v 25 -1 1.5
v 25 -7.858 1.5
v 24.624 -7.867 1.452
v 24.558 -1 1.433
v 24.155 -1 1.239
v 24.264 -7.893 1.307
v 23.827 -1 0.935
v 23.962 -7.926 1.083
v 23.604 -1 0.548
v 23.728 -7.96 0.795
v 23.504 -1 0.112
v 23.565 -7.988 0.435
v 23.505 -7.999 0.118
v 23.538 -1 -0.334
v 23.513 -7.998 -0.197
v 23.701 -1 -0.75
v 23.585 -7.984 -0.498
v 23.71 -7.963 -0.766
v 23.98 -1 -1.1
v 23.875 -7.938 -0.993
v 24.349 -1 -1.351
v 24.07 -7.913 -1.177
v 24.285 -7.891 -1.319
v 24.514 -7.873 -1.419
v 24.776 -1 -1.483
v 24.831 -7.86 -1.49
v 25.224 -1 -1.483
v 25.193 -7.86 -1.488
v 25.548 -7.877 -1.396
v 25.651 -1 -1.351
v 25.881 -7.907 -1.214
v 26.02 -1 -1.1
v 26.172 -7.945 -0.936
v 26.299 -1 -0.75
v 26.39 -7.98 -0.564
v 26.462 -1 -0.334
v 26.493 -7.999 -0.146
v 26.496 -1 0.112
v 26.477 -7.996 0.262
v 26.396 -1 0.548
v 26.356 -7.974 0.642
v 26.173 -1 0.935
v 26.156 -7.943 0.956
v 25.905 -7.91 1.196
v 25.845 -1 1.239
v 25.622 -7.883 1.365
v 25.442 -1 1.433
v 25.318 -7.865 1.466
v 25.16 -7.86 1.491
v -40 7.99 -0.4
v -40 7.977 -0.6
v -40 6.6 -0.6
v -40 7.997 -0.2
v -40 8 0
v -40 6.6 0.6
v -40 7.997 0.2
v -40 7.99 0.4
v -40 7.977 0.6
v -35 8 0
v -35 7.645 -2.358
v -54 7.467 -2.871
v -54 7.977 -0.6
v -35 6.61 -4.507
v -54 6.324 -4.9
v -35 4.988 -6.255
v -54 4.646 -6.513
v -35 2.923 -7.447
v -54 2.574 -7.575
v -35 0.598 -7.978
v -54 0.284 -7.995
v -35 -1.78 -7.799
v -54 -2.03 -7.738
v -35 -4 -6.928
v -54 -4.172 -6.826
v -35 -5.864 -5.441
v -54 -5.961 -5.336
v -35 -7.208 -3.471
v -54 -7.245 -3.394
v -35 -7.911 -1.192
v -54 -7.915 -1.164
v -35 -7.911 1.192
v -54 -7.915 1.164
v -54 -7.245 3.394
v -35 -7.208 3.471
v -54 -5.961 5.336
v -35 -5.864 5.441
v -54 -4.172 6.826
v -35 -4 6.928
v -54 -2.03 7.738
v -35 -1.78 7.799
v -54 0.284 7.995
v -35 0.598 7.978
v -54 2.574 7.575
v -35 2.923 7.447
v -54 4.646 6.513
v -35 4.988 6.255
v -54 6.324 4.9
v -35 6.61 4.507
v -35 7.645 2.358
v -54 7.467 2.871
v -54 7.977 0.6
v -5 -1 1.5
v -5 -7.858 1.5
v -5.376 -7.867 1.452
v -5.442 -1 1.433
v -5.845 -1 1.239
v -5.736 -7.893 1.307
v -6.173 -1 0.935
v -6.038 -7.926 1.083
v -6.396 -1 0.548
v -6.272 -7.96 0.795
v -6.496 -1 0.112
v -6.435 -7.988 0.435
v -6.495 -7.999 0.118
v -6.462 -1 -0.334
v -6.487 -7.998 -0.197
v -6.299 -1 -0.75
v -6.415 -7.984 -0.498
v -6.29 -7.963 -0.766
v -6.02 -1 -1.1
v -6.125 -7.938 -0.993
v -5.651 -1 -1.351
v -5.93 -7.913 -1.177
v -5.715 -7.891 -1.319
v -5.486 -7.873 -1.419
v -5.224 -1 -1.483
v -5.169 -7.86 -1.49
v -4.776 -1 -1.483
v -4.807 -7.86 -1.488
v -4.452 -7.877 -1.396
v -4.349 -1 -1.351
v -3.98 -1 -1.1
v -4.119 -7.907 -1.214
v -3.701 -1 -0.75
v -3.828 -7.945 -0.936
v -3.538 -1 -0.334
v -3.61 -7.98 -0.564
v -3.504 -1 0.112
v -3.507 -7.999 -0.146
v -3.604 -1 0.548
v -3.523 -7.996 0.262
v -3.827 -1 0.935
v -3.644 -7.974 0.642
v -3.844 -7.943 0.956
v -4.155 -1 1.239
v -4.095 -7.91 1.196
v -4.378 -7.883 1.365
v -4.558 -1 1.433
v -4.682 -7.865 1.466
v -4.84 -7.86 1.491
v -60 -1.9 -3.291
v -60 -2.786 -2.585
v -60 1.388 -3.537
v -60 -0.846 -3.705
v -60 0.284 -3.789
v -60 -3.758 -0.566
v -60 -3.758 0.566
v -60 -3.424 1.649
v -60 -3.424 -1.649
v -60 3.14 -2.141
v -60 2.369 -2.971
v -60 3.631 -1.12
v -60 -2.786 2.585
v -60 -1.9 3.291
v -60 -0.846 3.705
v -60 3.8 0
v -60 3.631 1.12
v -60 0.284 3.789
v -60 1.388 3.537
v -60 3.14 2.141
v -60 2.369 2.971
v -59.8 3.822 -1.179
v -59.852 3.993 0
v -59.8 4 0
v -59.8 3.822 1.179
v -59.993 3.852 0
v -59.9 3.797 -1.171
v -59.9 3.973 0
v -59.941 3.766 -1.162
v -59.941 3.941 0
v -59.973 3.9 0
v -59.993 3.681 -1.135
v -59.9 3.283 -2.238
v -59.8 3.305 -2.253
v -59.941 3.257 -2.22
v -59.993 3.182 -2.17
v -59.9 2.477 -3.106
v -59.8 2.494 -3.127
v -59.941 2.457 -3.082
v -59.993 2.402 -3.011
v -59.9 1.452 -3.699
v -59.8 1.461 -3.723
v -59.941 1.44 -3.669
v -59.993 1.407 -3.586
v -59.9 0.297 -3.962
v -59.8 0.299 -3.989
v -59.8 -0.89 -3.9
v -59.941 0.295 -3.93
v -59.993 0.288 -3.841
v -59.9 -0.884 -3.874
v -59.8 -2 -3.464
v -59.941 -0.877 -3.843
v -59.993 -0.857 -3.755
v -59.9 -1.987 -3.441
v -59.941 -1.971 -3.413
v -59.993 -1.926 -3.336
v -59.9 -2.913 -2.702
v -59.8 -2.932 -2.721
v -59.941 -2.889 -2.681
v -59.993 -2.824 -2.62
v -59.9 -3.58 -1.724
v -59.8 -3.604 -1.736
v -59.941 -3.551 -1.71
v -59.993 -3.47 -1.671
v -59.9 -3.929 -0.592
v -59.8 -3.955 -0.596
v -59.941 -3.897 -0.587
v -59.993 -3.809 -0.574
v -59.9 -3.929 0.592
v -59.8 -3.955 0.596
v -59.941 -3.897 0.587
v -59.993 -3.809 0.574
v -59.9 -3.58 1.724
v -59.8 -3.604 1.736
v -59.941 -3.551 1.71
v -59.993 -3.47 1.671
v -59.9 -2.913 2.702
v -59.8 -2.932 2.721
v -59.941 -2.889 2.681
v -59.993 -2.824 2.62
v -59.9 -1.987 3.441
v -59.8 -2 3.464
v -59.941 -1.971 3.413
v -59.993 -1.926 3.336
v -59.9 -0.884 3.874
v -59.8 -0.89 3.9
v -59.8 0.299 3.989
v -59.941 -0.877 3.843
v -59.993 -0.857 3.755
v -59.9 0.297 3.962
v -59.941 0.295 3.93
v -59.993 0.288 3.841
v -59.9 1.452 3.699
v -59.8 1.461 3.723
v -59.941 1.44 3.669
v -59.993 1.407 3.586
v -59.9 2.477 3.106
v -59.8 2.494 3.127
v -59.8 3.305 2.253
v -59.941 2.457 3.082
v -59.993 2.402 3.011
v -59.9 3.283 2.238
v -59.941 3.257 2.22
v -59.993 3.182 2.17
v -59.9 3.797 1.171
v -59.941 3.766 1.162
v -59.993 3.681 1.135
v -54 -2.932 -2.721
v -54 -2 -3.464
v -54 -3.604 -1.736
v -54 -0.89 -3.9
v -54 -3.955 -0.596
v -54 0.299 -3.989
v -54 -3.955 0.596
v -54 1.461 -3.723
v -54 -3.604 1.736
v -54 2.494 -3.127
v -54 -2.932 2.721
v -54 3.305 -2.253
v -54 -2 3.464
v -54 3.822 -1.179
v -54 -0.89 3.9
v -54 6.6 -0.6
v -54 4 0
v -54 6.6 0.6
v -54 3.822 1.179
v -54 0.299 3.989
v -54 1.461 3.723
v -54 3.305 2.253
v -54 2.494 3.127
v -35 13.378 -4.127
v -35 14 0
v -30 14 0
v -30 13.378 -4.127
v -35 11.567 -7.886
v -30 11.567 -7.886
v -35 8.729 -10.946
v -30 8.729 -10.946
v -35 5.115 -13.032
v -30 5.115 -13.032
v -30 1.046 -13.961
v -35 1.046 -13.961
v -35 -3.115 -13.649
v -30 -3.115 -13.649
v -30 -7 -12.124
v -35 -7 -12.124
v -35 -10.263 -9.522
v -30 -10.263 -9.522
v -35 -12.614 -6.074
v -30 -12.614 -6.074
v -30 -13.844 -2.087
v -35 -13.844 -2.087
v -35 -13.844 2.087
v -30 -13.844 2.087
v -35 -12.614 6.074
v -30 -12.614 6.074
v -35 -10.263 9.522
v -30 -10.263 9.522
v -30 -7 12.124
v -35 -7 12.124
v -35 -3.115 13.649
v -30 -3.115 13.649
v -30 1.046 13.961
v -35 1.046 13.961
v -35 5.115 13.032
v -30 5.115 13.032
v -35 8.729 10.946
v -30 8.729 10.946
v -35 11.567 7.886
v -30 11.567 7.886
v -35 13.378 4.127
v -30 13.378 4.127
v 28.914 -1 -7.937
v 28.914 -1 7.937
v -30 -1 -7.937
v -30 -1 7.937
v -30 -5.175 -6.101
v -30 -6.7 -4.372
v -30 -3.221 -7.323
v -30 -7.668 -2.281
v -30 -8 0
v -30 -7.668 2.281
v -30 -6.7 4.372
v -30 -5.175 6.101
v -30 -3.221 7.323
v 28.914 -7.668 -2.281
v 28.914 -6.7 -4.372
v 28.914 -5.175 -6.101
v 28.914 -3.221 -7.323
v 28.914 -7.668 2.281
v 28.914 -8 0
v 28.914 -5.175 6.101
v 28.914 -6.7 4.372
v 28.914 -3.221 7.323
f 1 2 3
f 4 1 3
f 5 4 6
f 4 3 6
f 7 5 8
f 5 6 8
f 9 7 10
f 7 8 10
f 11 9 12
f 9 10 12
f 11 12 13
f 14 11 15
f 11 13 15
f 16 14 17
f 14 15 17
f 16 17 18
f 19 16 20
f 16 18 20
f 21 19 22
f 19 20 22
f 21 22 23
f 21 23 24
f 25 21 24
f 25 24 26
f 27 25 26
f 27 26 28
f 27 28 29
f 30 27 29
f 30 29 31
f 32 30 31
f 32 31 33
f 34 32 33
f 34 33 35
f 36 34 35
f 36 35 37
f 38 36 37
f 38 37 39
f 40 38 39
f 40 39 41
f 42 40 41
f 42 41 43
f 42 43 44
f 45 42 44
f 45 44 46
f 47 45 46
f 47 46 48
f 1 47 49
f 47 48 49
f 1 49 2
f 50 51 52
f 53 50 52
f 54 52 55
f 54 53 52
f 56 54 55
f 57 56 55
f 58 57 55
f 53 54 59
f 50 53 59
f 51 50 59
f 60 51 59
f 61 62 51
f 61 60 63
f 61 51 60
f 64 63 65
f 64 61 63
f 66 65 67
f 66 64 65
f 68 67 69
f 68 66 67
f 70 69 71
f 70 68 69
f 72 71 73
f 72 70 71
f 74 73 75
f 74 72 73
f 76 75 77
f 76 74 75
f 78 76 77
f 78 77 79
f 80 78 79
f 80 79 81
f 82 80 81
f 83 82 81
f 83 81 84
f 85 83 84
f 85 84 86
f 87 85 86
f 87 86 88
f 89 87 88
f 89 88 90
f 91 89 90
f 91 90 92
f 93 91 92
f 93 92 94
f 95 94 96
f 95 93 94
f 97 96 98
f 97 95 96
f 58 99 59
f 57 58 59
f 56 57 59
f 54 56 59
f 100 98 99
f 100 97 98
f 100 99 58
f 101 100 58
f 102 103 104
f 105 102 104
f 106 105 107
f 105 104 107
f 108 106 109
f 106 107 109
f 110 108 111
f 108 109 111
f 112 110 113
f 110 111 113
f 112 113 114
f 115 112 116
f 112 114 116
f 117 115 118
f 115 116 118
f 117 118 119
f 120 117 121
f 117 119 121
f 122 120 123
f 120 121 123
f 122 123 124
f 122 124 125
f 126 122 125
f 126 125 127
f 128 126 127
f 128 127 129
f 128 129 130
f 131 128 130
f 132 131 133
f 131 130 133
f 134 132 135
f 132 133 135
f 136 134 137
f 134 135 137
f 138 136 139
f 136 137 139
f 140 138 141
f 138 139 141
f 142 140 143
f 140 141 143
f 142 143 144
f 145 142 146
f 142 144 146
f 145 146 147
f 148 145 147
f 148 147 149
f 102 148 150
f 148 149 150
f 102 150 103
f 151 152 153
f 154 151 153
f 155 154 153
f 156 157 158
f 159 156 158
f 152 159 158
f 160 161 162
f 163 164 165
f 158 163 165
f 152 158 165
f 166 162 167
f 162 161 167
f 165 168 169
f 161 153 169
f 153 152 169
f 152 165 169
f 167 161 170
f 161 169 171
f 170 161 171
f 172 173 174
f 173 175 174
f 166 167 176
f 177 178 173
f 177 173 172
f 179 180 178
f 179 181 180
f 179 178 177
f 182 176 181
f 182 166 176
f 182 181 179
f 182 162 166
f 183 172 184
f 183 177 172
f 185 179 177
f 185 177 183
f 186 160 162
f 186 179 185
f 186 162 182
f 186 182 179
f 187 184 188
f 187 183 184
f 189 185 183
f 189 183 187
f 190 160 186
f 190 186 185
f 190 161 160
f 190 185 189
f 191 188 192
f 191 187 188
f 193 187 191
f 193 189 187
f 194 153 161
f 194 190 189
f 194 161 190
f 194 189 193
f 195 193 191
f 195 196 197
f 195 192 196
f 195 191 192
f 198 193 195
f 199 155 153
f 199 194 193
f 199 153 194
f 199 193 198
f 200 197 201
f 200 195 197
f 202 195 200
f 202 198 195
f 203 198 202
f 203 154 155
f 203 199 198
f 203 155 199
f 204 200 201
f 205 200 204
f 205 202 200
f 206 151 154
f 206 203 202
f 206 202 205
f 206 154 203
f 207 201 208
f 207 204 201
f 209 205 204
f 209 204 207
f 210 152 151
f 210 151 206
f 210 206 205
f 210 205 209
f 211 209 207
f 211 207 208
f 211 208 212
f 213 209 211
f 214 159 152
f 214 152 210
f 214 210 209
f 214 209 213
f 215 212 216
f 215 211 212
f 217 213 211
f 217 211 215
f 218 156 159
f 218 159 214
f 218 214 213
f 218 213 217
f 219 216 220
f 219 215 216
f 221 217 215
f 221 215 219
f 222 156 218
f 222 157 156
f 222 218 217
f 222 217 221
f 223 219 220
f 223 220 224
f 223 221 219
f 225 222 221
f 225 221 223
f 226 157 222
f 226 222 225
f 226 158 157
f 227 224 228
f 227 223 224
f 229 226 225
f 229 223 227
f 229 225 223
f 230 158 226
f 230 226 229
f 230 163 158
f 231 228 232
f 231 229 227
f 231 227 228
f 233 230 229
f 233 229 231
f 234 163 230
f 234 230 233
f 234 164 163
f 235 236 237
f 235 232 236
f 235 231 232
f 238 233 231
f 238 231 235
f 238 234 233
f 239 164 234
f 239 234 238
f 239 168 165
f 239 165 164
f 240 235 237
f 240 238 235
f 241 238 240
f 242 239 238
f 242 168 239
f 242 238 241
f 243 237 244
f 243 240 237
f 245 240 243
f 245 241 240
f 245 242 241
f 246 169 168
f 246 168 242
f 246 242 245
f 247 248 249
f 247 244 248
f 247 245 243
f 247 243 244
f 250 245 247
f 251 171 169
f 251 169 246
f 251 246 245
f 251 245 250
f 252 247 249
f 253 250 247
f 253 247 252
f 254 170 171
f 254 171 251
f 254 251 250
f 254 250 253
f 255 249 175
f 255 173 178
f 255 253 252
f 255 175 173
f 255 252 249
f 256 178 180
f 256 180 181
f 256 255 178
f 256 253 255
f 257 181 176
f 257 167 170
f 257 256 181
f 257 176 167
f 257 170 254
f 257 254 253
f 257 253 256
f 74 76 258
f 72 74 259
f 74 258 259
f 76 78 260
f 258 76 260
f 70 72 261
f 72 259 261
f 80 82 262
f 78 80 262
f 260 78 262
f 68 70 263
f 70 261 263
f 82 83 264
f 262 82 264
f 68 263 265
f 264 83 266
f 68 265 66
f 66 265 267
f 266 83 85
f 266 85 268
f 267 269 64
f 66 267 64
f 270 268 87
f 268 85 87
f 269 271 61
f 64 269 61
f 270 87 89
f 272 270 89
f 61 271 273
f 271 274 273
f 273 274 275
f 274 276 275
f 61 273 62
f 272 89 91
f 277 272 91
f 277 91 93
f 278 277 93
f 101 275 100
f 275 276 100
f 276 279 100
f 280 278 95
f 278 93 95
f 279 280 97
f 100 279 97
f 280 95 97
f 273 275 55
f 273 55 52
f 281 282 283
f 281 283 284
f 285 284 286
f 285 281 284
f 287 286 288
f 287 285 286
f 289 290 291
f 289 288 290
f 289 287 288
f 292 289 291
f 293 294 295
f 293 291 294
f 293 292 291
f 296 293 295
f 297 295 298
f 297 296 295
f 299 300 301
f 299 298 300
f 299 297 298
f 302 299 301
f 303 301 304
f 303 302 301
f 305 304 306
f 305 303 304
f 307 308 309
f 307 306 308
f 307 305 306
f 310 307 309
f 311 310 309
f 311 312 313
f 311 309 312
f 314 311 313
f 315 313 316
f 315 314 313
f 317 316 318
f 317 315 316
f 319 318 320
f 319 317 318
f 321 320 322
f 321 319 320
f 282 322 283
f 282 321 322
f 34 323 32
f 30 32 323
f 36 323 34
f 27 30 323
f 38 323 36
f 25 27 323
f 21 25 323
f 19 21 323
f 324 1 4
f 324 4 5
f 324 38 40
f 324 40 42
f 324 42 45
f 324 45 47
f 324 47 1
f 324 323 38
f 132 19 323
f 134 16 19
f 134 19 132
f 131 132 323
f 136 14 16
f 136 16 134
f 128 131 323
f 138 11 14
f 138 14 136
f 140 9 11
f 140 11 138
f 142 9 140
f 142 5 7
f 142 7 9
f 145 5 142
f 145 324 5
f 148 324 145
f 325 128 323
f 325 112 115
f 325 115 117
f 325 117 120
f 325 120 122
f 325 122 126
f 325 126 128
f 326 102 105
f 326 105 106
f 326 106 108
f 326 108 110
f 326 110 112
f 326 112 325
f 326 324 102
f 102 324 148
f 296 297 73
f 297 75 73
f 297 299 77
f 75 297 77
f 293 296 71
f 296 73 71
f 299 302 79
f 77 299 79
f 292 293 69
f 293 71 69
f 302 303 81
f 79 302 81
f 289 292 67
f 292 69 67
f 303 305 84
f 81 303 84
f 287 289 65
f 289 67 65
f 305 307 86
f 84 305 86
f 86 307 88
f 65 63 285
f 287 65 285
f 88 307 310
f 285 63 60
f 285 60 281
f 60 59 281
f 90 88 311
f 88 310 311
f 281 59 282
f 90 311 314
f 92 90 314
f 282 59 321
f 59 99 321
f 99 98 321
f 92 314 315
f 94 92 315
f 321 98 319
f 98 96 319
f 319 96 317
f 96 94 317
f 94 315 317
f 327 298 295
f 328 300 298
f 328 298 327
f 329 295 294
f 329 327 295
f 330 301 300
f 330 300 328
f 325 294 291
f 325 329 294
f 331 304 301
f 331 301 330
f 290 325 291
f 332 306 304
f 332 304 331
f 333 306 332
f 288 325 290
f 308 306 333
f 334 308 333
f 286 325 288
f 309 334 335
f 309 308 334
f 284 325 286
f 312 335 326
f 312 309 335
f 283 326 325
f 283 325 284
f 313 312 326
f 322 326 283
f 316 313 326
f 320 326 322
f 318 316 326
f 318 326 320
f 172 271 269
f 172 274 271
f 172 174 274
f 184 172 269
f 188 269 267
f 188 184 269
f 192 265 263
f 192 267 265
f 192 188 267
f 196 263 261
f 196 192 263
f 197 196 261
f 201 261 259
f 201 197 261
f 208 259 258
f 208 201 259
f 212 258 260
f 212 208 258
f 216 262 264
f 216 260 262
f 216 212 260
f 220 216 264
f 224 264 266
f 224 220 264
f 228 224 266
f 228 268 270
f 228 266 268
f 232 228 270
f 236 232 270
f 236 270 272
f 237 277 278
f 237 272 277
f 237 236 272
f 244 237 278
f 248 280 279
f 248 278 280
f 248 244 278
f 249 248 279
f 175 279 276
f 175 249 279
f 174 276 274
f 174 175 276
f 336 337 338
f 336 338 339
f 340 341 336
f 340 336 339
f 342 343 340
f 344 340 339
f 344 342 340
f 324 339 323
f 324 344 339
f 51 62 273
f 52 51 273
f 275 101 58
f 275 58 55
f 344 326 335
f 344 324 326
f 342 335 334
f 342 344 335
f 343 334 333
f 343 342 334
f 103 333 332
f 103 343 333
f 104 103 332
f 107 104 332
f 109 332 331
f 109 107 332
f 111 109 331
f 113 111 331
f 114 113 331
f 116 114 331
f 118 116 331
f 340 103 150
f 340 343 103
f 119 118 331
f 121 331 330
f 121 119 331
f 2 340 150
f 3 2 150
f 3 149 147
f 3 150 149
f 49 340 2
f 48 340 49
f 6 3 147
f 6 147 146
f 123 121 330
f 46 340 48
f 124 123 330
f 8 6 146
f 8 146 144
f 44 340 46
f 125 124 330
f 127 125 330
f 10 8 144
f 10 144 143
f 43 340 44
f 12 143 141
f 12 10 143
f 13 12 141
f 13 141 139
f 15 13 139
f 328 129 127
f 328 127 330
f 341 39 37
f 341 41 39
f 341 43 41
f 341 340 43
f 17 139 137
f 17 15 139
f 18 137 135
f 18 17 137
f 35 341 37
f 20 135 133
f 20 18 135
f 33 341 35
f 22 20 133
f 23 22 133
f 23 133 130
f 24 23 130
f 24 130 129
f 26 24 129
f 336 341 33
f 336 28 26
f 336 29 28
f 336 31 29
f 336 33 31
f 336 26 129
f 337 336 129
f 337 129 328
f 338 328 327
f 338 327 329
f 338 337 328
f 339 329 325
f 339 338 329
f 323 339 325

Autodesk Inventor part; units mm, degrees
ref_plane "YZ Plane" through (0, 0, 0) normal (1, 0, 0) x (0, 1, 0)
ref_plane "XZ Plane" through (0, 0, 0) normal (0, 1, 0) x (-1, 0, 0)
ref_plane "XY Plane" through (0, 0, 0) normal (0, 0, 1) x (1, 0, 0)
sketch "Esboço1" plane through (0, 0, 0) normal (0, 0, 1) x (1, 0, 0)
  line L0 (-30, 8) -> (28.9137, 8)
  line L1 (28.9137, 0) -> (28.9137, 8)
  line L2 (-30, 8) -> (-30, 14)
  line L3 (-30, 14) -> (-35, 14)
  line L4 (-35, 14) -> (-35, 8)
  line L5 (-35, 8) -> (-54, 8)
  line L6 (-54, 8) -> (-54, 4)
  line L7 (-54, 4) -> (-60, 4)
  line L8 (-60, 4) -> (-60, 0)
  line L9 (-60, 0) -> (28.9137, 0)
  point P0 (0, 0)
  dimension "d2" = 6
  dimension "d3" = 5
  dimension "d4" = 6
  dimension "d5" = 19
  dimension "d6" = 4
  dimension "d7" = 6
revolve "Revolução1" add sketch "Esboço1" angle 360 about axis through (-60, 0, 0) along (1, 0, 0)
sketch "Esboço2" plane through (0, 0, 0) normal (0, 1, 0) x (-1, 0, 0)
  line L0 (-28.9137, 8) -> (-28.9137, -8) projected
  line L1 (30, 8) -> (30, -8) projected
  line L2 (-28.9137, 8) -> (30, 8)
  line L3 (30, 8) -> (30, -8)
  line L4 (30, -8) -> (-28.9137, -8)
  line L5 (-28.9137, -8) -> (-28.9137, 8)
  point P0 (0, 0)
extrude "Extrusão1" cut sketch "Esboço2" along normal blind 10 and the other way blind 1
sketch "Esboço3" plane through (0, -1, 0) normal (0, 1, 0) x (1, 0, 0)
  line L0 (-30, -14) -> (-30, 14) projected
  point P0 (0, 0)
  point P1 (-5, 0)
  point P2 (25, 0)
  dimension "d13" = 25
  dimension "d14" = 30
hole "Furo1" at (-5, -1, 0) at (25, -1, 0) direction (0, -1, 0) diameter 3 end through all
thread "Rosca1" size "M8x0.75" class "6g" standard "ANSI Metric M Profile" length 7
fillet "Arredondamento1" radius 0.2 1 edges at (-60, -4, 0)
sketch "Esboço4" plane through (-54, 0, 0) normal (-1, 0, 0) x (0, 0, 1)
  circle A0 centre (0, 0) radius 8 projected
  line L0 (0, 8) -> (0.6, 8)
  line L1 (0.6, 8) -> (0.6, 6.6)
  line L2 (0.6, 6.6) -> (0, 6.6)
  line L3 (0, 6.6) -> (0, 8)
  line L4 (0, 8) -> (-0.6, 8)
  line L5 (-0.6, 8) -> (-0.6, 6.6)
  line L6 (-0.6, 6.6) -> (0, 6.6)
  line L7 (0, 6.6) -> (0, 8)
  point P0 (0.6, 7.9775)
  point P1 (-0.6, 7.9775)
  dimension "d25" = 0.6
  dimension "d26" = 1.4
  dimension "d27" = 0.6
  dimension "d28" = 1.4
extrude "Extrusão2" cut sketch "Esboço4" against normal blind 14 contours L1 L2 L3 A0 | A0 L3 L6 L5
properties part number "Eixo"
